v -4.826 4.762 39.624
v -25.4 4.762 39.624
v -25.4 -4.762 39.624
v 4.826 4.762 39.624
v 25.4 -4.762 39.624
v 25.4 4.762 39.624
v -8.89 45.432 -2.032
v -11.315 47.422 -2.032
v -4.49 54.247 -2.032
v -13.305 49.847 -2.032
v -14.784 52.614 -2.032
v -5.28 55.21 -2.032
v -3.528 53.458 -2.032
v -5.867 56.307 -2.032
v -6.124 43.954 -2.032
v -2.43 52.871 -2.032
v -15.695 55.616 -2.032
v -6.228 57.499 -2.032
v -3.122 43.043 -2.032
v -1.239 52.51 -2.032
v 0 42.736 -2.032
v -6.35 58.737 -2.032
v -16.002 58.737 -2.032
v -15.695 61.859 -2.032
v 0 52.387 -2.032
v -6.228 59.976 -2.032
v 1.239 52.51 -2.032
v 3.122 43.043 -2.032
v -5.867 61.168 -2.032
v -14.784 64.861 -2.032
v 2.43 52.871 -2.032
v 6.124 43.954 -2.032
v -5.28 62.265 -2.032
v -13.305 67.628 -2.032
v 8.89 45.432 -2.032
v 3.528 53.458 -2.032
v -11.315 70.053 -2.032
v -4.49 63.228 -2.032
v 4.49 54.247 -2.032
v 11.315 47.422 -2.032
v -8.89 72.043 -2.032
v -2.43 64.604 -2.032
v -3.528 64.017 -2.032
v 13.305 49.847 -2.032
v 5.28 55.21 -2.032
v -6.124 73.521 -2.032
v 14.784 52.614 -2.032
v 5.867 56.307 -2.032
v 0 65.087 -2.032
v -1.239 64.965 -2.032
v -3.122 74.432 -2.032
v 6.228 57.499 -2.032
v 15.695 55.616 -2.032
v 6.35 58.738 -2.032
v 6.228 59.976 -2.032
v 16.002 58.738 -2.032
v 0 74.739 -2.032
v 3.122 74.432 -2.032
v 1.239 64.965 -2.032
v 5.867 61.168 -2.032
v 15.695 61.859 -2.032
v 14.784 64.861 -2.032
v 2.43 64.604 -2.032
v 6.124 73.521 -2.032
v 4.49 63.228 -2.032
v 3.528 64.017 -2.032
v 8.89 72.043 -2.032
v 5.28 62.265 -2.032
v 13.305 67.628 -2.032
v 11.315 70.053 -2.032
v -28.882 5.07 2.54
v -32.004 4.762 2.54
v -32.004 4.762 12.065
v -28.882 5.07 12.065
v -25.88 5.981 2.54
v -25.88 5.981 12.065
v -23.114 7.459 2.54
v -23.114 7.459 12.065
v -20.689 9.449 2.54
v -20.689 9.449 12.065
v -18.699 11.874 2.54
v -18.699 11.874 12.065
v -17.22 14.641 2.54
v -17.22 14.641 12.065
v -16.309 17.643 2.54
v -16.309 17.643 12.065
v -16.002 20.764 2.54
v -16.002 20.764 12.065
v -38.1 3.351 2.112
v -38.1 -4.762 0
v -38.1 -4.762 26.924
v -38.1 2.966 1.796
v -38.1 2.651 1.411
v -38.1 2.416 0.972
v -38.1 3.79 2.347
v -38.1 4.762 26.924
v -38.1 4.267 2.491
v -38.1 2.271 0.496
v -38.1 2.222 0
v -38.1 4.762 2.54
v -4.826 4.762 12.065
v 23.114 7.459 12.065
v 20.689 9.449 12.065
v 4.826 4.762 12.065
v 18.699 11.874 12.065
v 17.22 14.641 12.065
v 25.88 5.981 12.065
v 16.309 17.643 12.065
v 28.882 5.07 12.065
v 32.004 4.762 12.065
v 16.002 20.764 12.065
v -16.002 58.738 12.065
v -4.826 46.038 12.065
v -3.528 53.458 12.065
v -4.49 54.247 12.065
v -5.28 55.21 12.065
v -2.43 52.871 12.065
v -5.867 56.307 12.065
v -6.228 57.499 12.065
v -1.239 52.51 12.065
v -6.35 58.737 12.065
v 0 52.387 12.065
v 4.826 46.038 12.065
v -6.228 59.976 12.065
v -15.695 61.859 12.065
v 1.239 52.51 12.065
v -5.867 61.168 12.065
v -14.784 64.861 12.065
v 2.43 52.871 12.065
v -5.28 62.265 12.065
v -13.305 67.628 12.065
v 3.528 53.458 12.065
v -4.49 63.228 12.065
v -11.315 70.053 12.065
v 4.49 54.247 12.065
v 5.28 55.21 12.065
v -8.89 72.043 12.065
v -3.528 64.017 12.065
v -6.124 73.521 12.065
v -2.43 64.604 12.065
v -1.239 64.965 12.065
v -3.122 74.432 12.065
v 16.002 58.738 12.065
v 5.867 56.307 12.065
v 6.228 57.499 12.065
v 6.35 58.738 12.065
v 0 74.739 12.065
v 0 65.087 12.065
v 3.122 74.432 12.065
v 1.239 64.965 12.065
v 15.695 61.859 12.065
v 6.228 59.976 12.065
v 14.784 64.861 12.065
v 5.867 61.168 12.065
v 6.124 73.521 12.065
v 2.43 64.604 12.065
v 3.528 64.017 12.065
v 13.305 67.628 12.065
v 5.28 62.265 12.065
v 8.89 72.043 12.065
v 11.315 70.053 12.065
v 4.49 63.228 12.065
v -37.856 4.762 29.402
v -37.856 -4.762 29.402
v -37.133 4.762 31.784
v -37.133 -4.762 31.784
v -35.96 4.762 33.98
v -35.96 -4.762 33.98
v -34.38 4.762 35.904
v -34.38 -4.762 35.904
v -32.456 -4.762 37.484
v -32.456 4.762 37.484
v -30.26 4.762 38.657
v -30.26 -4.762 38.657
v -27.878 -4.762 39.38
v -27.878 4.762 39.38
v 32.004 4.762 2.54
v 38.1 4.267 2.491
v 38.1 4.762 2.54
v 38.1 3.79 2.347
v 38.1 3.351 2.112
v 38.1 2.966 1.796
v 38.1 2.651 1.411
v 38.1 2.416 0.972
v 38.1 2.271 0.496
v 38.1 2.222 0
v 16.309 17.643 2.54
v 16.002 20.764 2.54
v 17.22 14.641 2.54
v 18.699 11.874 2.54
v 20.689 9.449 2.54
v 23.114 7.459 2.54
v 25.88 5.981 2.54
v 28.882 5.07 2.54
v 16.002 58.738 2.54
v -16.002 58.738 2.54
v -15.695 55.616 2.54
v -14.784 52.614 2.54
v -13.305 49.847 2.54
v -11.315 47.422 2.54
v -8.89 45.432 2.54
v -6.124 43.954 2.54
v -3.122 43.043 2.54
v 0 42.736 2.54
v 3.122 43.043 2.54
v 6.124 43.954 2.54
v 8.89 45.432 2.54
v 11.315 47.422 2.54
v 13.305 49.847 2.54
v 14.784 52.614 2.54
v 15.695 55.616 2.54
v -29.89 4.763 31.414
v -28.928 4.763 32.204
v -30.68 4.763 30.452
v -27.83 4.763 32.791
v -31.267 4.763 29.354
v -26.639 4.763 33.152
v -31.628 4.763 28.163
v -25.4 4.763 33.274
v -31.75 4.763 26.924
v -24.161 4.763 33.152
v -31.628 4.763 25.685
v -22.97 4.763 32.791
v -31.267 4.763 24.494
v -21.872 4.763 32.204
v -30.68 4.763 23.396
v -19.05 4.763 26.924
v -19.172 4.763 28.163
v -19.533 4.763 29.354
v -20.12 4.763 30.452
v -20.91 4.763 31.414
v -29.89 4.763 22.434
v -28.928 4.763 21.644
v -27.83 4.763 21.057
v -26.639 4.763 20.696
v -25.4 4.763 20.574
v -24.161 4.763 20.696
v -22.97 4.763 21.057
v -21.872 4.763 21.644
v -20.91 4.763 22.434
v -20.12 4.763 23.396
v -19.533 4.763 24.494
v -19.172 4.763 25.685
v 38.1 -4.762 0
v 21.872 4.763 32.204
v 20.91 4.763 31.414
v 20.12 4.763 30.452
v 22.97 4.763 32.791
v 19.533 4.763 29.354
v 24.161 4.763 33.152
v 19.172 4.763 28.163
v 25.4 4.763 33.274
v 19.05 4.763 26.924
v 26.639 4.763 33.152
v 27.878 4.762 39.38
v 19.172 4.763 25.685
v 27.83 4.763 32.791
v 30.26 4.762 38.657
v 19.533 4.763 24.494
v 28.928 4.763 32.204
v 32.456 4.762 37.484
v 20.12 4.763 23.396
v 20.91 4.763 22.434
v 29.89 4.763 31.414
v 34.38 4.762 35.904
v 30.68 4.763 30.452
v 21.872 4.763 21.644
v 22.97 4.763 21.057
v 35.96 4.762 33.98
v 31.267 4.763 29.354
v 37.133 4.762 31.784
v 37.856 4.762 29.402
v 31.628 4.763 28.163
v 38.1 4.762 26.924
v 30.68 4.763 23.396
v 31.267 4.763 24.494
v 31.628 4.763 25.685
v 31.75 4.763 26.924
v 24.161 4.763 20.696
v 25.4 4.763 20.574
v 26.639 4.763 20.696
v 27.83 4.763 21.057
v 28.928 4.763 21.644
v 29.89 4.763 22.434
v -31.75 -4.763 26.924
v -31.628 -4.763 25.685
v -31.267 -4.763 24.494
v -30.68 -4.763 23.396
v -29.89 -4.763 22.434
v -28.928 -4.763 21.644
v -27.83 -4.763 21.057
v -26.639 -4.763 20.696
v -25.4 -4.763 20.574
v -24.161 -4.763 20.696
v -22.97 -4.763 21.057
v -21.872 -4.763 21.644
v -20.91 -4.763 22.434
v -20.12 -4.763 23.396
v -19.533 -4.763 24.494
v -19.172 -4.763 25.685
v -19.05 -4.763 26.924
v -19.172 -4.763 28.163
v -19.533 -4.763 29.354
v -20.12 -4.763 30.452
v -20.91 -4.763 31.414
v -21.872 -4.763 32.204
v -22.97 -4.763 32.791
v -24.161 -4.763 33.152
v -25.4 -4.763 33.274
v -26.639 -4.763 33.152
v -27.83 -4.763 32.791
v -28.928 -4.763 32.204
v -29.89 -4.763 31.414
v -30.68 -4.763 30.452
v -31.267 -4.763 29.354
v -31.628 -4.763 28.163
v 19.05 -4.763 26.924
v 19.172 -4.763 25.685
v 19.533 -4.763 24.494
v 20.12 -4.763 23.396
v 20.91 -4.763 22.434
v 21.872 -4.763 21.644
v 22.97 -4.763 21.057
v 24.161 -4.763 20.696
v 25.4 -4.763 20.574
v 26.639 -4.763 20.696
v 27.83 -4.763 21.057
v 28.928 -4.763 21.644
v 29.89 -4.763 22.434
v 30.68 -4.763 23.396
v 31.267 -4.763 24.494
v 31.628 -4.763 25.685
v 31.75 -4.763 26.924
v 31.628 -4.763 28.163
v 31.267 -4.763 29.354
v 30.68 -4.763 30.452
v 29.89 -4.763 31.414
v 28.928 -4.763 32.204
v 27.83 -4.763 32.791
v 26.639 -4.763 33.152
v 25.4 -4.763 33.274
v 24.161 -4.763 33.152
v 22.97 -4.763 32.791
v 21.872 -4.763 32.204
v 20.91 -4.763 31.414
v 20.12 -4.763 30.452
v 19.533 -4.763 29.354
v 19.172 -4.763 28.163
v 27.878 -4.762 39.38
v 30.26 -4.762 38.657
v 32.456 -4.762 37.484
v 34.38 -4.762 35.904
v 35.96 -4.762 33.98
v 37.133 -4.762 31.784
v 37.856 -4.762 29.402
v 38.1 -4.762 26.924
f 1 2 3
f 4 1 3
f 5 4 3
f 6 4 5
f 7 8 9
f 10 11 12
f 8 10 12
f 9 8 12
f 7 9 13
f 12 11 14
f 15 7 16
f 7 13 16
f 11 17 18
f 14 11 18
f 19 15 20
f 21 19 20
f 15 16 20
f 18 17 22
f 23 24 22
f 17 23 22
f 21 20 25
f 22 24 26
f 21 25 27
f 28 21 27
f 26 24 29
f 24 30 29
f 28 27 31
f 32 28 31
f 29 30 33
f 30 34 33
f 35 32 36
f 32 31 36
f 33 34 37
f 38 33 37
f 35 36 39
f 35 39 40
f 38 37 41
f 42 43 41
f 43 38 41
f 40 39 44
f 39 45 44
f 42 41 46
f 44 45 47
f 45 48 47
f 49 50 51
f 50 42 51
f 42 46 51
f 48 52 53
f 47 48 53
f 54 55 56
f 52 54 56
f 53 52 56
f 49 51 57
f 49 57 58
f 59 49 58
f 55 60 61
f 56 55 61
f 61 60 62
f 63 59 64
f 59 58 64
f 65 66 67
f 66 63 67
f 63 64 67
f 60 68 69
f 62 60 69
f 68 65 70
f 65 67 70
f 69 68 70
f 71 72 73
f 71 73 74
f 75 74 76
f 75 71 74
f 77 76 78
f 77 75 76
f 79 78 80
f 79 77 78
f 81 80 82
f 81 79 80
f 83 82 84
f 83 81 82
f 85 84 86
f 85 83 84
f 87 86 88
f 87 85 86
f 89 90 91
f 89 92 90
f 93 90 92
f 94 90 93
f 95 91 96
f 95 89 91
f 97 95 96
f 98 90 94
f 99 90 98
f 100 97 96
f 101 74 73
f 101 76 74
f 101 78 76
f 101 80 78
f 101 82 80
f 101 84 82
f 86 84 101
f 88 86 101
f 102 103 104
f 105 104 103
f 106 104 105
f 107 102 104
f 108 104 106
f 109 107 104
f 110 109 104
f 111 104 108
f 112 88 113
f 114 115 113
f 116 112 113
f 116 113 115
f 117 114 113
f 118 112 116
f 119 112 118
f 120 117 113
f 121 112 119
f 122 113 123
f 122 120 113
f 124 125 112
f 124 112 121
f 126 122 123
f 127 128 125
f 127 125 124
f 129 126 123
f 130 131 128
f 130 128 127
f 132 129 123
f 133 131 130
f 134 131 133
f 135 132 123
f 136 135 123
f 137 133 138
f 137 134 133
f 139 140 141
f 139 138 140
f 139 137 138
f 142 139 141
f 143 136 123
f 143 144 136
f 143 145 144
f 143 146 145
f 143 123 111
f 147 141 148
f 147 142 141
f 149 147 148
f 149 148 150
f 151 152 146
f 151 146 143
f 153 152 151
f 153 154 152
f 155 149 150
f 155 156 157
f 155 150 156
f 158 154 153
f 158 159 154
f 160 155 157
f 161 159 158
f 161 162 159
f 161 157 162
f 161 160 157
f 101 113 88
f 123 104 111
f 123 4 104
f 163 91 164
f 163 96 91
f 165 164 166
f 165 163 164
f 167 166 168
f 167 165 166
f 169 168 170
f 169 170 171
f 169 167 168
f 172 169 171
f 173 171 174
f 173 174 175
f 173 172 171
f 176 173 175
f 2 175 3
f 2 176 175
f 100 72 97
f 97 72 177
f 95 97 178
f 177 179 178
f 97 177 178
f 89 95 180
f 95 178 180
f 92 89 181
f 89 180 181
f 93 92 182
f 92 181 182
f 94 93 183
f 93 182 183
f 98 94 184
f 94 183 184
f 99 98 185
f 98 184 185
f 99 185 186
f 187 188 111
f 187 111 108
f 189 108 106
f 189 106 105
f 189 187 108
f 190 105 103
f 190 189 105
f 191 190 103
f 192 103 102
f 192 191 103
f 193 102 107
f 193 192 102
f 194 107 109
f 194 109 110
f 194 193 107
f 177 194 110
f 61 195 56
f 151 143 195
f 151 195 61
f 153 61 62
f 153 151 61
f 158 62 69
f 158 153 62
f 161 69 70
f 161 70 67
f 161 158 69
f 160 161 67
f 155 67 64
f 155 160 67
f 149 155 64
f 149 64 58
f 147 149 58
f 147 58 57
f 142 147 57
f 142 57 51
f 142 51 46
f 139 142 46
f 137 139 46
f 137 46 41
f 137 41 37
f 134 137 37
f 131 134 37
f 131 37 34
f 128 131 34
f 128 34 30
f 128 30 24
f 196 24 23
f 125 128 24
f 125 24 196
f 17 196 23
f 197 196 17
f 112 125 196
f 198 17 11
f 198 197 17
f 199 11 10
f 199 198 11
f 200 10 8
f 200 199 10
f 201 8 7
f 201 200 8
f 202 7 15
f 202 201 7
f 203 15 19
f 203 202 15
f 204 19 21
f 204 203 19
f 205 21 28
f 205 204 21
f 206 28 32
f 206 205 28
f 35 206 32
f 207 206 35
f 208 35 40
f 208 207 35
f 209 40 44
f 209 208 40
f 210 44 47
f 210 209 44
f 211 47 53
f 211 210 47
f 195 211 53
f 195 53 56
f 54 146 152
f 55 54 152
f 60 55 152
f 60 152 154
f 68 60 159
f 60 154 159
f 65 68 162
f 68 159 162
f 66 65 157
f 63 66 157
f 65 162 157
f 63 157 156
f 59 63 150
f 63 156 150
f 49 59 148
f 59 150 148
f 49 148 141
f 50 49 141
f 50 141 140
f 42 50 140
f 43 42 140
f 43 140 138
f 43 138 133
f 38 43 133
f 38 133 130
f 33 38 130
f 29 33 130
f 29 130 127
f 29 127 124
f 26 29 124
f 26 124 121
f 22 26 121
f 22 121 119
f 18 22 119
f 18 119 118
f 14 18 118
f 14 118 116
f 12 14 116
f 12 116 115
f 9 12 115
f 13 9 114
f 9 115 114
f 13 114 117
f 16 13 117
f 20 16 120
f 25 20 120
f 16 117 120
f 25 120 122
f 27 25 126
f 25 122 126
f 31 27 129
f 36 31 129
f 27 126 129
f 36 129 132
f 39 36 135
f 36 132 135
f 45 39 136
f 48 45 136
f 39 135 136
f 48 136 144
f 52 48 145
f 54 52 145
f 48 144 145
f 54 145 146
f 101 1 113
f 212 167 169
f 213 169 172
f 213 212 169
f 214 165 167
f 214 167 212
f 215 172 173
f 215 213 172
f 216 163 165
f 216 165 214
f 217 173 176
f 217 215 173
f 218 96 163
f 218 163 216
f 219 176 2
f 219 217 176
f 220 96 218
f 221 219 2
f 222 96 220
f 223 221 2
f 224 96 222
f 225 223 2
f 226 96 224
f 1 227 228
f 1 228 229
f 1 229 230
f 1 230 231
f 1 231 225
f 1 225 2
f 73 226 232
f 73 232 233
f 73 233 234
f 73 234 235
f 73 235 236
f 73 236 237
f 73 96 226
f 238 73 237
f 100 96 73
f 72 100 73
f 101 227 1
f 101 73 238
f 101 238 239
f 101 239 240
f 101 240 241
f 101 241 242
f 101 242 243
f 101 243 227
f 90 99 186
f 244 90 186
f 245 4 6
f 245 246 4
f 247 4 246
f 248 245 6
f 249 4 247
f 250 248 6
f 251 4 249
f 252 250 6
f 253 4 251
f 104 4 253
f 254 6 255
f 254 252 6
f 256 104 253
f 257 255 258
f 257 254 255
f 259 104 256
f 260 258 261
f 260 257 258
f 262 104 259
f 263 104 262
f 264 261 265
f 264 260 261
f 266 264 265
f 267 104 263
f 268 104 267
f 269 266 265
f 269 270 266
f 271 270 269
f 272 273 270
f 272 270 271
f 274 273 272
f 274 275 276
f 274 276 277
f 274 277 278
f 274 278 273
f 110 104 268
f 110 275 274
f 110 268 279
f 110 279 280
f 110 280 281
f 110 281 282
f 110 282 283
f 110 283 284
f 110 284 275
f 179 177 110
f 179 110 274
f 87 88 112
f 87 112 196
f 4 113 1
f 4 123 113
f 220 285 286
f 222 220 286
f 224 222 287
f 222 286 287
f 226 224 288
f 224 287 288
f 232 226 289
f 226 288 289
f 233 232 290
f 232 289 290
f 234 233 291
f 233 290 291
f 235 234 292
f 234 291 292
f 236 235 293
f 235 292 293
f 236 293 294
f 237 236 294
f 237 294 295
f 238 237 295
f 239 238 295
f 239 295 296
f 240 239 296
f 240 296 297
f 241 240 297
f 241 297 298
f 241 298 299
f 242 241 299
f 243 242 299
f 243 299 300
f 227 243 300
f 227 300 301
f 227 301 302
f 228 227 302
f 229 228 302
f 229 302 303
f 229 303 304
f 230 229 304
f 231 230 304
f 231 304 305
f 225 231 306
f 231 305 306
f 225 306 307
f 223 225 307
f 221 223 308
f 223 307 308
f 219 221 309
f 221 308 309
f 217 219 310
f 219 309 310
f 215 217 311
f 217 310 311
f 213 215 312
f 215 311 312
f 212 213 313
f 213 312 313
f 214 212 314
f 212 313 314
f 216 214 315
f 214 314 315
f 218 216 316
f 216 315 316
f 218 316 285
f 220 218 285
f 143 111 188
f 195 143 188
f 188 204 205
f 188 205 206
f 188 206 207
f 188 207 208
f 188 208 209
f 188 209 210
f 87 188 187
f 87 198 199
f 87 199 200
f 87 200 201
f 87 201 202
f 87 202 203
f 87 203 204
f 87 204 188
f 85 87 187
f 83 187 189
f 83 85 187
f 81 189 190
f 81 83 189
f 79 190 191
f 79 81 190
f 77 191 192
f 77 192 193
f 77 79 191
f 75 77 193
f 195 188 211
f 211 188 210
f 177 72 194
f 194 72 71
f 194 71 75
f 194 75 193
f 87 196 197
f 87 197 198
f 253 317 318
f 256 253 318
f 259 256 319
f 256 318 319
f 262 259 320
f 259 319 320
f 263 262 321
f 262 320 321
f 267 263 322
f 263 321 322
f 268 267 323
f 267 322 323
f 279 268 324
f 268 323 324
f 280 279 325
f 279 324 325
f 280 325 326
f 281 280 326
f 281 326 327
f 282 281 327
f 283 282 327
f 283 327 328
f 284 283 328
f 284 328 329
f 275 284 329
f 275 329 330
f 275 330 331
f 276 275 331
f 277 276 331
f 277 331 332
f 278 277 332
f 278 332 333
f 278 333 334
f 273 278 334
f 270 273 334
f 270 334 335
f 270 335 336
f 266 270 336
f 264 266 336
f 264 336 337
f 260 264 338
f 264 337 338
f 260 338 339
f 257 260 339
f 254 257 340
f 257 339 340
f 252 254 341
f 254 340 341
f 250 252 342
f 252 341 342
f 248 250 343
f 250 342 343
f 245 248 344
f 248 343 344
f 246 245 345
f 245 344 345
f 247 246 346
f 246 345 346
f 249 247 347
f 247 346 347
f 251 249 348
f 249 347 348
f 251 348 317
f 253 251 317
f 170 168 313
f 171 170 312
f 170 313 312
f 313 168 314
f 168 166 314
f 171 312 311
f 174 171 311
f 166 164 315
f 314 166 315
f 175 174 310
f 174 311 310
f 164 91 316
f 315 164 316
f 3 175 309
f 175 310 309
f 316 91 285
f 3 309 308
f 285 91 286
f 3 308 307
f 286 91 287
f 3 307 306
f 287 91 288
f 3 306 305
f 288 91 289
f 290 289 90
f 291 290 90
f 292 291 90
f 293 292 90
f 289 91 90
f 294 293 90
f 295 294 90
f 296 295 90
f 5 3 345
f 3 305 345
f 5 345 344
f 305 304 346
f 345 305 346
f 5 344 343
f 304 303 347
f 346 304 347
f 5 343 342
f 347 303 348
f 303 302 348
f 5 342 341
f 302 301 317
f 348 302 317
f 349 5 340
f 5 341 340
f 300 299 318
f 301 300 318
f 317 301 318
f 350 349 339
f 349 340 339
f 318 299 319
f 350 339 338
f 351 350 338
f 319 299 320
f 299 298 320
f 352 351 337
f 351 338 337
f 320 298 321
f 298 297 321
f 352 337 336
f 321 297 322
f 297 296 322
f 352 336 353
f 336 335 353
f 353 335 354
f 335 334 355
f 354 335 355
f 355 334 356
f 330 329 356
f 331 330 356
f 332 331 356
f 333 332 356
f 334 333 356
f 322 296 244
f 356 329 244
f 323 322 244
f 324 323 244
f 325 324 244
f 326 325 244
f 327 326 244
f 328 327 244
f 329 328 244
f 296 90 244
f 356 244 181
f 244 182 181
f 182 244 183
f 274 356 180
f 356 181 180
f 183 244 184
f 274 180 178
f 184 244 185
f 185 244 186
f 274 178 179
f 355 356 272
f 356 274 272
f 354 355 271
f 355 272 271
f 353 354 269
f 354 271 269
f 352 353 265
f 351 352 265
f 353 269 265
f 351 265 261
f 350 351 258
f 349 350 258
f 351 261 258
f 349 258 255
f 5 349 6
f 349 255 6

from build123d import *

# Parameters (mm, degrees)
SKETCH1_W                  = 76.2
SKETCH1_H                  = 9.525
BOSS_EXTRUDE1_DEPTH        = 39.624
FILLET1_R                  = 12.7
SKETCH2_R                  = 2.54
CUT_EXTRUDE1_DEPTH         = 87.018502558
SKETCH3_W                  = 32.004
SKETCH3_H                  = 9.525
BOSS_EXTRUDE2_DEPTH        = 53.975
FILLET2_R                  = 16.002
FILLET3_R                  = 16.002
SKETCH4_R                  = 16.002
BOSS_EXTRUDE3_DEPTH        = 14.097
BOSS_EXTRUDE4_DEPTH        = 4.826
SKETCH6_R                  = 6.35
CUT_EXTRUDE2_DEPTH         = 89.301196715
F_3_8_0_5_DIAMETER_HOLE1_D = 12.7


with BuildPart() as part:
    # Sketch1 → Boss-Extrude1 (new body)
    with BuildSketch(Plane.XY):
        Rectangle(SKETCH1_W, SKETCH1_H)
    extrude(amount=BOSS_EXTRUDE1_DEPTH)

    # Fillet1
    fillet1_edges = [part.edges().sort_by_distance(p)[0] for p in [
        (-38.1, 0, 39.624),
        (38.1, 0, 39.624),
    ]]
    fillet(fillet1_edges, radius=FILLET1_R)

    # Sketch2 → Cut-Extrude1 (cut, through all)
    with BuildSketch(Plane(origin=(38.1, 0, 0), x_dir=(0, 0, -1), z_dir=(1, 0, 0))):
        with Locations((0, 4.7625)):
            Circle(SKETCH2_R)
    extrude(amount=-CUT_EXTRUDE1_DEPTH, mode=Mode.SUBTRACT)

    # Sketch3 → Boss-Extrude2 (add)
    with BuildSketch(Plane(origin=(0, 4.7625, 0), x_dir=(1, 0, 0), z_dir=(0, 1, 0))):
        with Locations((0, -7.3025)):
            Rectangle(SKETCH3_W, SKETCH3_H)
    extrude(amount=BOSS_EXTRUDE2_DEPTH)

    # Fillet2
    fillet2_edges = [part.edges().sort_by_distance(p)[0] for p in [
        (-16.002, 4.7625, 7.3025),
    ]]
    fillet(fillet2_edges, radius=FILLET2_R)

    # Fillet3
    # the kernel refuses this fillet: 16.002 mm, written as the material it adds along each edge
    with BuildSketch(Plane(origin=(16.002, 4.7625, 2.54), x_dir=(0, 1, 0), z_dir=(0, 0, 1))) as fillet3_piece_1:
        with BuildLine():
            CenterArc((FILLET3_R, -FILLET3_R), FILLET3_R, 90, 90)
            Line((0, -FILLET3_R), (0, 0))
            Line((0, 0), (FILLET3_R, 0))
        make_face()
    extrude(amount=9.525)

    # Sketch4 → Boss-Extrude3 (add)
    with BuildSketch(Plane.XY.offset(12.065)):
        with Locations((0, 58.7375)):
            Circle(SKETCH4_R)
    extrude(amount=-BOSS_EXTRUDE3_DEPTH)

    # Sketch5 → Boss-Extrude4 (add, symmetric)
    with BuildSketch(Plane(origin=(0, 0, 0), x_dir=(0, 0, -1), z_dir=(1, 0, 0))):
        Polygon((-39.624, 4.7625), (-12.065, 4.7625), (-12.065, 46.0375), align=None)
    extrude(amount=BOSS_EXTRUDE4_DEPTH, both=True)

    # Sketch6 → Cut-Extrude2 (cut, through all)
    with BuildSketch(Plane.XY.offset(12.065)):
        with Locations((0, 58.7375)):
            Circle(SKETCH6_R)
    extrude(amount=-CUT_EXTRUDE2_DEPTH, mode=Mode.SUBTRACT)

    # 3/8 (0.5) Diameter Hole1 (through all)
    with Locations(Plane(origin=(0, 4.7625, 0), x_dir=(1, 0, 0), z_dir=(0, 1, 0))):
        with Locations((-25.4, -26.924), (25.4, -26.924)):
            Hole(F_3_8_0_5_DIAMETER_HOLE1_D / 2)


solid = part.part
